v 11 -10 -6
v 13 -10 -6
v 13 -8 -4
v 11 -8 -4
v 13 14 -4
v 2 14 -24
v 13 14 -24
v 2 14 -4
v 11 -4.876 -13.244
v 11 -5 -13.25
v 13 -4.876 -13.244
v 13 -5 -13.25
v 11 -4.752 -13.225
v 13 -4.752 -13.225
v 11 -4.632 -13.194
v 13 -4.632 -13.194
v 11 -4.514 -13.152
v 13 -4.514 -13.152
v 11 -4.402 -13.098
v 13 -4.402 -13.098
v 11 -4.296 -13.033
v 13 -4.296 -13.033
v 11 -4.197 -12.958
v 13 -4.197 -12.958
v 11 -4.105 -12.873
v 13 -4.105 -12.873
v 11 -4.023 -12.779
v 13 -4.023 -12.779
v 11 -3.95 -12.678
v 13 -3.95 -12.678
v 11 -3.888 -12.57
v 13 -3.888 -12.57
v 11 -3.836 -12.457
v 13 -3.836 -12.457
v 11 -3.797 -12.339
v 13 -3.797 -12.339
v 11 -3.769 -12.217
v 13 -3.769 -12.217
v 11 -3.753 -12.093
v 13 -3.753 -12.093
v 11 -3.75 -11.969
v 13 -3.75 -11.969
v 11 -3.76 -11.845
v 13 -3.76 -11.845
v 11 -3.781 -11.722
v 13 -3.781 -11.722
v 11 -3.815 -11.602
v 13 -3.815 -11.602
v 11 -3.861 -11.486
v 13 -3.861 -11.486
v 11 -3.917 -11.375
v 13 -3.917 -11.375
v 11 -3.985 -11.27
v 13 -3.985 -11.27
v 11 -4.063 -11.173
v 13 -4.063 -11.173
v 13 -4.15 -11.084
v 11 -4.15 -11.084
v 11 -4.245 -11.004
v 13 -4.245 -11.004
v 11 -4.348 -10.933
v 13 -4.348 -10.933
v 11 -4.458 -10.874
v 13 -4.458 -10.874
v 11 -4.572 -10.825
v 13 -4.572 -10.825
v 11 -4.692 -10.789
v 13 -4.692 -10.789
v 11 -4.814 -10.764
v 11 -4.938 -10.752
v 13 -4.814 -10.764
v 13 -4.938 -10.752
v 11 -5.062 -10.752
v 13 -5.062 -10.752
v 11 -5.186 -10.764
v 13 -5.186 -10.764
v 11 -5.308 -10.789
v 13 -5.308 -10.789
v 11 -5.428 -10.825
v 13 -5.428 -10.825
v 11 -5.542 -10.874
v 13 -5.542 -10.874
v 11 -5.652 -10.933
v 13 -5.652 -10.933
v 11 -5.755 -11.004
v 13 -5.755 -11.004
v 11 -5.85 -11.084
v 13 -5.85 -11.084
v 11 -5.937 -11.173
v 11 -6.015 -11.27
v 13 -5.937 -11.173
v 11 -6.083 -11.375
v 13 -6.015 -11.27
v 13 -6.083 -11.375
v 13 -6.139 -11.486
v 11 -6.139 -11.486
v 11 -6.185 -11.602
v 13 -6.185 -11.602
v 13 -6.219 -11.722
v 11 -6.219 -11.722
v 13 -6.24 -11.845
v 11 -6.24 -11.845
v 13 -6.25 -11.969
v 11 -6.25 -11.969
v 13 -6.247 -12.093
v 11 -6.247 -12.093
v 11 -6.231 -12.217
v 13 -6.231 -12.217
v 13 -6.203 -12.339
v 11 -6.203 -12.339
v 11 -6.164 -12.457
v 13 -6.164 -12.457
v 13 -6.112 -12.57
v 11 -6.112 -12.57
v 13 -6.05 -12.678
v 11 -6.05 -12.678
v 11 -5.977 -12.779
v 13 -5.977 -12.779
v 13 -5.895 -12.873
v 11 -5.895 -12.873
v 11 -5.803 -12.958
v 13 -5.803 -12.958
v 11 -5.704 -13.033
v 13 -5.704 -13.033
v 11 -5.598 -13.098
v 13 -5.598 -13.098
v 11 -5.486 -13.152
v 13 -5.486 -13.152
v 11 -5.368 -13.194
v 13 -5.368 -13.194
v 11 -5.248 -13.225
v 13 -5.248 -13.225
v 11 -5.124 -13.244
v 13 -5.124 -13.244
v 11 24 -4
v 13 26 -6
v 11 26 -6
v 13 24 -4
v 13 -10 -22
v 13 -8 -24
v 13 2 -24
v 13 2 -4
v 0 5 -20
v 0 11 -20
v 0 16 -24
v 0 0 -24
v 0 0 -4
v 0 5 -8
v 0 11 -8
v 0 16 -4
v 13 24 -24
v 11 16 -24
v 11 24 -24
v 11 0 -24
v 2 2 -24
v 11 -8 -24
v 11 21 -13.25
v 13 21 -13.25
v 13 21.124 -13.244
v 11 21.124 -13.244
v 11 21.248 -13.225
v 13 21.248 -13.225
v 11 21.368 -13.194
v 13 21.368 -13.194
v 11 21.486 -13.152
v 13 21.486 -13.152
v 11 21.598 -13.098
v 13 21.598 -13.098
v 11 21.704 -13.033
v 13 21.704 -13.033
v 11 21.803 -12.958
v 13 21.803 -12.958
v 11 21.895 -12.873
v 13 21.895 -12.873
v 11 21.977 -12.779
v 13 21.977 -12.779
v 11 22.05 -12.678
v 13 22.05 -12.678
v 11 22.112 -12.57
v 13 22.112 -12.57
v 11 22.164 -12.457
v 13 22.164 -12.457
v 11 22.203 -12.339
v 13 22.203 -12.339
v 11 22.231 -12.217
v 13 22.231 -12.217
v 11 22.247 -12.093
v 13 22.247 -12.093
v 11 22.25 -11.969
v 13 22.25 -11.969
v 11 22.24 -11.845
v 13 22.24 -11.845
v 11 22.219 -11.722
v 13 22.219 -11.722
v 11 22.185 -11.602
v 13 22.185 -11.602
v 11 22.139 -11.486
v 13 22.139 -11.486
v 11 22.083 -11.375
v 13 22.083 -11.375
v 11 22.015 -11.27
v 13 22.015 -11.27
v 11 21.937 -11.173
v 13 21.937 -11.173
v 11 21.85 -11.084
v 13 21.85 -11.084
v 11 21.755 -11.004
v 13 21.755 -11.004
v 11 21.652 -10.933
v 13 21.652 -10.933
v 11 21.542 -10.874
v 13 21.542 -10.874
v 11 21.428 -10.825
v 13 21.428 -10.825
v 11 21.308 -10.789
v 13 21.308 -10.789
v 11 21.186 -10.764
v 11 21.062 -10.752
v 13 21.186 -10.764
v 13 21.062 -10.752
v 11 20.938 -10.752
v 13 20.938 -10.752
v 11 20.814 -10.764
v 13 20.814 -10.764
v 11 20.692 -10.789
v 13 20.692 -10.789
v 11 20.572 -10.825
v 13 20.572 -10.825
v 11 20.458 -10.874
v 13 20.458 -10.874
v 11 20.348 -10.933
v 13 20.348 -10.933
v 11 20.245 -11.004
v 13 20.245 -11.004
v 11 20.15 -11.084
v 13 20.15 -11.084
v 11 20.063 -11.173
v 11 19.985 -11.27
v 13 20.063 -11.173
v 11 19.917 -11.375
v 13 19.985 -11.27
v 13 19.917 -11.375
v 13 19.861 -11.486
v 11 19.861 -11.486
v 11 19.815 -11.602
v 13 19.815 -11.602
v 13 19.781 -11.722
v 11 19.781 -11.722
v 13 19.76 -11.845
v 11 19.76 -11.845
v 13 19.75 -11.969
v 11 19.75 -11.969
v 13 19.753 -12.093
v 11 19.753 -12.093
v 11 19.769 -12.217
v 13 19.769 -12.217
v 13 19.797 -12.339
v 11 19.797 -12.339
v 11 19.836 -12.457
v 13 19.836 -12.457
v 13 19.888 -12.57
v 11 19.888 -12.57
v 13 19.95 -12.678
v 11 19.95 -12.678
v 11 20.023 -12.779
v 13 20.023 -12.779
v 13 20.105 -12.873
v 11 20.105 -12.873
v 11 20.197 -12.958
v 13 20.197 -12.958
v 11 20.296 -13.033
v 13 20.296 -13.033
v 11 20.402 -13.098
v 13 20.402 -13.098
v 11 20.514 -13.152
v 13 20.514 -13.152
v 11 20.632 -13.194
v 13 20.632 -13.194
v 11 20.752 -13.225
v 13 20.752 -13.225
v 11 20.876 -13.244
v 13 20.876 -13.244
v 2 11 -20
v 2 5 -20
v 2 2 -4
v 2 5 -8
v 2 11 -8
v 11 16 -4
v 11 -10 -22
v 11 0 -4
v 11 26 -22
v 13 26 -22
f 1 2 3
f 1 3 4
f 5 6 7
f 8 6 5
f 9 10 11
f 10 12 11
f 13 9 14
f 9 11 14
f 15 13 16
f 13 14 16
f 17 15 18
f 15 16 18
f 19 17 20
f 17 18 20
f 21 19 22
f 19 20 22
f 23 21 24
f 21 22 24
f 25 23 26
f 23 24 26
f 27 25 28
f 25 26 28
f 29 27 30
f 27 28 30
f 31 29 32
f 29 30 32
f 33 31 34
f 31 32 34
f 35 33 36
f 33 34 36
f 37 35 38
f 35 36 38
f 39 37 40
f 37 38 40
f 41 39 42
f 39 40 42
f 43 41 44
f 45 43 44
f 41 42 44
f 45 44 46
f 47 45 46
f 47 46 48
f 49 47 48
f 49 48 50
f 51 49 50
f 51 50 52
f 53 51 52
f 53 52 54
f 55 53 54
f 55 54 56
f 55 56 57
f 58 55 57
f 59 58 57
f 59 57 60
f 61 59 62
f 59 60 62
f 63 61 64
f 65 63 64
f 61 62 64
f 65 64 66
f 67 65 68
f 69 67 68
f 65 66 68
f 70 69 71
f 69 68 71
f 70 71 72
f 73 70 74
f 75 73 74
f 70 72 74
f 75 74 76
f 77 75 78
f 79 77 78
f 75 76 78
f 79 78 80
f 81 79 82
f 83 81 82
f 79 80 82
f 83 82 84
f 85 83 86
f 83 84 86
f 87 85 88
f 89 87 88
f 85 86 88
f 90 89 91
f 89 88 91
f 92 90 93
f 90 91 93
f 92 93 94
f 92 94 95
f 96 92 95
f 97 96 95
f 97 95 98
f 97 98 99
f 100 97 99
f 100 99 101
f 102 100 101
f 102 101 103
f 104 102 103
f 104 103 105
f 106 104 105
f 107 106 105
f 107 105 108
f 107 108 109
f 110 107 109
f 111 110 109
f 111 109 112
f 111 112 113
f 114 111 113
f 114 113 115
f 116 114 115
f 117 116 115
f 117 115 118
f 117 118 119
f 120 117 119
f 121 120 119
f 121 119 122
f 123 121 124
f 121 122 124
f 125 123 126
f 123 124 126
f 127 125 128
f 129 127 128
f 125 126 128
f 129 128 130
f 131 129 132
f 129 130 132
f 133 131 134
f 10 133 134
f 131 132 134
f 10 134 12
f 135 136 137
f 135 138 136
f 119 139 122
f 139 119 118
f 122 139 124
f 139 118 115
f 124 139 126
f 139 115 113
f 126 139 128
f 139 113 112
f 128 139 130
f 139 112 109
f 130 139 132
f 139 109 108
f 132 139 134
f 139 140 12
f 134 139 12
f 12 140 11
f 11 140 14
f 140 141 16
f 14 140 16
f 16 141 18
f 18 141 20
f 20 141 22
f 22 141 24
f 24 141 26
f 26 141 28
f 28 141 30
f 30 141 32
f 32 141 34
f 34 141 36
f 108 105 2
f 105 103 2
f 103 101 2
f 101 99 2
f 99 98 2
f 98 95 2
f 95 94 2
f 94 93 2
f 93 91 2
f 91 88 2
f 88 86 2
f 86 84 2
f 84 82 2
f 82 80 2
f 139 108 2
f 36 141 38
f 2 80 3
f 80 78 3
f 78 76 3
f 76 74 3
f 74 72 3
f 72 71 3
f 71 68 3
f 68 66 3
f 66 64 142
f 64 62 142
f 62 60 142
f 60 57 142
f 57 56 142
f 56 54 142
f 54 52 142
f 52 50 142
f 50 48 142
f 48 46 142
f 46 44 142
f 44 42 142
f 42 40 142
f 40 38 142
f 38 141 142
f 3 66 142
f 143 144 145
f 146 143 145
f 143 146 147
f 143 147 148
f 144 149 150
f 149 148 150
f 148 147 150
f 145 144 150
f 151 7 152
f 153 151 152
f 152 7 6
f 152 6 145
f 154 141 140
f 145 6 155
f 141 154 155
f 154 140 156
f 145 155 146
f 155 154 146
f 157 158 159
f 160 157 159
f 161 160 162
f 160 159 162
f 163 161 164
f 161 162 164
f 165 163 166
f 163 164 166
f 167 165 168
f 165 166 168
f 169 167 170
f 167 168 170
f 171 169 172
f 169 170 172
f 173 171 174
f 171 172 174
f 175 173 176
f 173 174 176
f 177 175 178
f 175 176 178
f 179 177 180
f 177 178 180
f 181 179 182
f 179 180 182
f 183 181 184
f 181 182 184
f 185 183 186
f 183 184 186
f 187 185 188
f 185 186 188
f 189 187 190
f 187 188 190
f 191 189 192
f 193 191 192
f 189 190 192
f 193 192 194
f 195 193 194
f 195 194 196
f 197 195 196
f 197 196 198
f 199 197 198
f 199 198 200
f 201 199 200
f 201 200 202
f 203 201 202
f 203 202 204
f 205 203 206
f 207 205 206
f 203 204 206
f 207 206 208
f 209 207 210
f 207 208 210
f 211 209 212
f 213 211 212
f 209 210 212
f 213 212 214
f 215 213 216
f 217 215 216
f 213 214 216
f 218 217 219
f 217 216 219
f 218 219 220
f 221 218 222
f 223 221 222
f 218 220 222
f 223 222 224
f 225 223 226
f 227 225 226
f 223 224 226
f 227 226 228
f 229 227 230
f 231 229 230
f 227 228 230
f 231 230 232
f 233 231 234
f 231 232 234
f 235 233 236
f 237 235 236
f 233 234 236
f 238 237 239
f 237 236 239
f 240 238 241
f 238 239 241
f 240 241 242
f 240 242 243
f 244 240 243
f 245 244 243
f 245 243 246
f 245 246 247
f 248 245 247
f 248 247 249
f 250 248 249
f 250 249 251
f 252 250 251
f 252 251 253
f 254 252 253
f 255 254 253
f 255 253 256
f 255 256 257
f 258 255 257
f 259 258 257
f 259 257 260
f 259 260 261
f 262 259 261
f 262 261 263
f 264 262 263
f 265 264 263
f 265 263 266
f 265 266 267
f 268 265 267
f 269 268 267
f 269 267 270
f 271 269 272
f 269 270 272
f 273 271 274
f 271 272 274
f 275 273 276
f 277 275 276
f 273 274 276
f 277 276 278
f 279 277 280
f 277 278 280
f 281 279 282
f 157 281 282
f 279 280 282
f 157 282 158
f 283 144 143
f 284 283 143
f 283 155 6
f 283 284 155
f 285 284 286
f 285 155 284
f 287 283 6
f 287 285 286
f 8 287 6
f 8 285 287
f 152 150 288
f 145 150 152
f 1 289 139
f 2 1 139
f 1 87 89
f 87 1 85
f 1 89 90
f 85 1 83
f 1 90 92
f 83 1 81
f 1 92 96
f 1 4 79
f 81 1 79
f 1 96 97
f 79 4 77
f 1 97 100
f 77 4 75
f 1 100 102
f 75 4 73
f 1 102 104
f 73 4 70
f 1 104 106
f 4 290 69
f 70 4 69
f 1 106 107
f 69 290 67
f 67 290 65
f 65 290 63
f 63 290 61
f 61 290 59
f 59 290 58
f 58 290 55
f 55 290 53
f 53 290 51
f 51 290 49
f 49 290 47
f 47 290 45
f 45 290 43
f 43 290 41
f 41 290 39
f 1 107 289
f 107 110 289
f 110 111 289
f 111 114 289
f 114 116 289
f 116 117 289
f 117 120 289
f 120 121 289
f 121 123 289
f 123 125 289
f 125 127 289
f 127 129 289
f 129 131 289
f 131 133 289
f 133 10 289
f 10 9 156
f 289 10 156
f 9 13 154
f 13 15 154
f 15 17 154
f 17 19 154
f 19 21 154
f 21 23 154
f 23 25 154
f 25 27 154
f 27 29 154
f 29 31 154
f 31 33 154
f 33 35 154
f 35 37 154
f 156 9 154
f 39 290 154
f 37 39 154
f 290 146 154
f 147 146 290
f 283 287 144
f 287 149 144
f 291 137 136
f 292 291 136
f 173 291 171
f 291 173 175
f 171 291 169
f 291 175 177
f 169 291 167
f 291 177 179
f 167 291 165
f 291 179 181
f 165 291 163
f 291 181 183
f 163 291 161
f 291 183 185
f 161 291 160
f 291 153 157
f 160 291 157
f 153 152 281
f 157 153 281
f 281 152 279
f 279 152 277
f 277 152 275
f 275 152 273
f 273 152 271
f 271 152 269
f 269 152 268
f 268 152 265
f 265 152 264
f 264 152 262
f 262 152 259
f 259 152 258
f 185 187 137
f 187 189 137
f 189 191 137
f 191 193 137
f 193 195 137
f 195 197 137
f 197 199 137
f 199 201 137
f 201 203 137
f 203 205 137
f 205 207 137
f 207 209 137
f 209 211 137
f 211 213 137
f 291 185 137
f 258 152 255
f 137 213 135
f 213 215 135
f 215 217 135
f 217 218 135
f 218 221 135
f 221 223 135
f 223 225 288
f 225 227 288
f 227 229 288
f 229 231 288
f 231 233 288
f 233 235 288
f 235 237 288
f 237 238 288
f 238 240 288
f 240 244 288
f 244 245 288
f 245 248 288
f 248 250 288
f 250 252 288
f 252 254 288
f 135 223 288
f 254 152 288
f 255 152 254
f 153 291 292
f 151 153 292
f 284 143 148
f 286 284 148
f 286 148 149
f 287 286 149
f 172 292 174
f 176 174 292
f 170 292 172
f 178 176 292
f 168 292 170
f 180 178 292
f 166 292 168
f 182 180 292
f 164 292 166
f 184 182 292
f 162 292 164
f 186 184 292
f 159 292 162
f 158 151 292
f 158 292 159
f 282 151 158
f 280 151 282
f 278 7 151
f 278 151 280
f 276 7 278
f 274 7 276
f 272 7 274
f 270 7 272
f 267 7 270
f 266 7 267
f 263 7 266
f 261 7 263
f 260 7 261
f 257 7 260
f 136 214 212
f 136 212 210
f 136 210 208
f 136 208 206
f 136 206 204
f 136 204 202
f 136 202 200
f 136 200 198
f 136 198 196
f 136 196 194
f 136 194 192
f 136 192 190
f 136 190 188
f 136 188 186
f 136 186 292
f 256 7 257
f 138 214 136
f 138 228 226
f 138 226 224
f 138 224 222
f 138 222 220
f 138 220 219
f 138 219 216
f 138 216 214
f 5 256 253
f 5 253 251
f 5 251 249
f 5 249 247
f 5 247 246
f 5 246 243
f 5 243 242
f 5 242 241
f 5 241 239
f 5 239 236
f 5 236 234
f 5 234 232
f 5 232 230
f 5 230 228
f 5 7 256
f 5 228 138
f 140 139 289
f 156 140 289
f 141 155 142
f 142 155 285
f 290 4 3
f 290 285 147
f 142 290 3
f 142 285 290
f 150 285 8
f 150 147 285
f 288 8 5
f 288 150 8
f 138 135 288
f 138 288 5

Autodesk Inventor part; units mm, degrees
ref_plane "YZ Plane" through (0, 0, 0) normal (1, 0, 0) x (0, 1, 0)
ref_plane "XZ Plane" through (0, 0, 0) normal (0, 1, 0) x (-1, 0, 0)
ref_plane "XY Plane" through (0, 0, 0) normal (0, 0, 1) x (1, 0, 0)
sketch "Sketch1" plane through (0, 0, 0) normal (1, 0, 0) x (0, 1, 0)
  line L0 (0, 0) -> (16, 0)
  line L1 (16, 0) -> (16, -24)
  line L2 (16, -24) -> (0, -24)
  line L3 (0, -24) -> (0, 0)
  dimension "d0" = 16
  dimension "d1" = 24
extrude "Extrusion1" add sketch "Sketch1" along normal blind 2
sketch "Sketch2" plane through (2, 0, 0) normal (1, 0, 0) x (0, 0, -1)
  line L0 (24, 16) -> (0, 16) projected
  line L1 (0, 16) -> (24, 16)
  line L2 (24, 16) -> (24, 14)
  line L3 (24, 14) -> (0, 14)
  line L4 (0, 14) -> (0, 16)
  line L5 (0, 16) -> (0, 0) projected
  line L6 (0, 0) -> (24, 0)
  line L7 (24, 0) -> (24, 2)
  line L8 (24, 2) -> (0, 2)
  line L9 (0, 2) -> (0, 0)
  dimension "d4" = 24
  dimension "d5" = 2
  dimension "d6" = 24
  dimension "d7" = 2
extrude "Extrusion2" add sketch "Sketch2" along normal blind 11
sketch "Sketch3" plane through (0, 0, -24) normal (0, -1, 0) x (1, 0, 0)
  line L0 (13, 24) -> (11, 24)
  line L1 (11, 24) -> (11, 0)
  line L2 (11, 0) -> (13, 0)
  line L3 (13, 0) -> (13, 24)
  point P0 (0, 24)
  dimension "d10" = 2
  dimension "d11" = 24
extrude "Extrusion3" add sketch "Sketch3" along normal blind 10
sketch "Sketch4" plane through (0, 16, 0) normal (0, 1, 0) x (1, 0, 0)
  line L0 (13, 24) -> (13, 0) projected
  line L1 (13, 24) -> (11, 24)
  line L2 (11, 24) -> (11, 0)
  line L3 (11, 0) -> (13, 0)
  line L4 (13, 0) -> (13, 24)
  point P0 (0, 0)
  point P1 (13, 0)
  dimension "d14" = 2
  dimension "d15" = 24
extrude "Extrusion4" add sketch "Sketch4" along normal blind 10
sketch "Sketch5" plane through (13, 0, 0) normal (1, 0, 0) x (0, 0, -1)
  line L0 (0, 0) -> (0, -5)
  line L1 (0, 2) -> (0, -10) projected
  line L2 (0, -5) -> (12, -5)
  line L3 (24, 0) -> (24, -10) projected
  circle A0 centre (12, -5) radius 1.25
  line L4 (0, 14) -> (24, 14) projected
  line L5 (0, 14) -> (0, 21)
  line L6 (0, 14) -> (0, 26) projected
  line L7 (0, 21) -> (12, 21)
  circle A1 centre (12, 21) radius 1.25
  dimension "d18" = 5
  dimension "d19" = 12
  dimension "d20" = 2.5
  dimension "d21" = 7
  dimension "d22" = 12
  dimension "d23" = 2.5
extrude "Extrusion5" cut sketch "Sketch5" against normal blind 10
sketch "Sketch7" plane through (0, 0, 0) normal (-1, 0, 0) x (0, 0, 1)
  line L0 (-20, 5) -> (-8, 5)
  line L1 (-8, 5) -> (-8, 11)
  line L2 (-8, 11) -> (-20, 11)
  line L3 (-20, 11) -> (-20, 5)
  line L4 (-24, 0) -> (-24, 16) projected
  point P0 (0, 0)
  dimension "d26" = 6
  dimension "d27" = 12
  dimension "d28" = 5
  dimension "d29" = 4
extrude "Extrusion6" cut sketch "Sketch7" against normal blind 10
sketch "Sketch8" plane through (0, 0, 0) normal (0, 0, 1) x (1, 0, 0)
  line L0 (11, -10) -> (13, -10) projected
  line L1 (11, -10) -> (13, -10)
  line L2 (13, 2) -> (13, -10) projected
  line L3 (13, -10) -> (13, 2)
  line L4 (2, 2) -> (13, 2) projected
  line L5 (13, 2) -> (2, 2)
  line L6 (2, 14) -> (2, 2) projected
  line L7 (2, 2) -> (2, 14)
  line L8 (13, 14) -> (13, 26) projected
  line L9 (2, 14) -> (13, 14)
  line L10 (13, 14) -> (13, 26)
  line L11 (11, 16) -> (11, 26) projected
  line L12 (13, 26) -> (11, 26)
  line L13 (11, 26) -> (11, 16)
  line L14 (11, 16) -> (0, 16)
  line L15 (0, 0) -> (11, 0) projected
  line L16 (0, 16) -> (0, 0)
  line L17 (0, 0) -> (11, 0)
  line L18 (11, 0) -> (11, -10) projected
  line L19 (11, 0) -> (11, -10)
extrude "Extrusion7" cut sketch "Sketch8" against normal blind 4
chamfer "Chamfer1" distance 2 angle 45 2 edges at (12, -10, -24) (12, 26, -24)
chamfer "Chamfer2" distance 2 angle 45 2 edges at (12, -10, -4) (12, 26, -4)
properties part number "houder motor"
